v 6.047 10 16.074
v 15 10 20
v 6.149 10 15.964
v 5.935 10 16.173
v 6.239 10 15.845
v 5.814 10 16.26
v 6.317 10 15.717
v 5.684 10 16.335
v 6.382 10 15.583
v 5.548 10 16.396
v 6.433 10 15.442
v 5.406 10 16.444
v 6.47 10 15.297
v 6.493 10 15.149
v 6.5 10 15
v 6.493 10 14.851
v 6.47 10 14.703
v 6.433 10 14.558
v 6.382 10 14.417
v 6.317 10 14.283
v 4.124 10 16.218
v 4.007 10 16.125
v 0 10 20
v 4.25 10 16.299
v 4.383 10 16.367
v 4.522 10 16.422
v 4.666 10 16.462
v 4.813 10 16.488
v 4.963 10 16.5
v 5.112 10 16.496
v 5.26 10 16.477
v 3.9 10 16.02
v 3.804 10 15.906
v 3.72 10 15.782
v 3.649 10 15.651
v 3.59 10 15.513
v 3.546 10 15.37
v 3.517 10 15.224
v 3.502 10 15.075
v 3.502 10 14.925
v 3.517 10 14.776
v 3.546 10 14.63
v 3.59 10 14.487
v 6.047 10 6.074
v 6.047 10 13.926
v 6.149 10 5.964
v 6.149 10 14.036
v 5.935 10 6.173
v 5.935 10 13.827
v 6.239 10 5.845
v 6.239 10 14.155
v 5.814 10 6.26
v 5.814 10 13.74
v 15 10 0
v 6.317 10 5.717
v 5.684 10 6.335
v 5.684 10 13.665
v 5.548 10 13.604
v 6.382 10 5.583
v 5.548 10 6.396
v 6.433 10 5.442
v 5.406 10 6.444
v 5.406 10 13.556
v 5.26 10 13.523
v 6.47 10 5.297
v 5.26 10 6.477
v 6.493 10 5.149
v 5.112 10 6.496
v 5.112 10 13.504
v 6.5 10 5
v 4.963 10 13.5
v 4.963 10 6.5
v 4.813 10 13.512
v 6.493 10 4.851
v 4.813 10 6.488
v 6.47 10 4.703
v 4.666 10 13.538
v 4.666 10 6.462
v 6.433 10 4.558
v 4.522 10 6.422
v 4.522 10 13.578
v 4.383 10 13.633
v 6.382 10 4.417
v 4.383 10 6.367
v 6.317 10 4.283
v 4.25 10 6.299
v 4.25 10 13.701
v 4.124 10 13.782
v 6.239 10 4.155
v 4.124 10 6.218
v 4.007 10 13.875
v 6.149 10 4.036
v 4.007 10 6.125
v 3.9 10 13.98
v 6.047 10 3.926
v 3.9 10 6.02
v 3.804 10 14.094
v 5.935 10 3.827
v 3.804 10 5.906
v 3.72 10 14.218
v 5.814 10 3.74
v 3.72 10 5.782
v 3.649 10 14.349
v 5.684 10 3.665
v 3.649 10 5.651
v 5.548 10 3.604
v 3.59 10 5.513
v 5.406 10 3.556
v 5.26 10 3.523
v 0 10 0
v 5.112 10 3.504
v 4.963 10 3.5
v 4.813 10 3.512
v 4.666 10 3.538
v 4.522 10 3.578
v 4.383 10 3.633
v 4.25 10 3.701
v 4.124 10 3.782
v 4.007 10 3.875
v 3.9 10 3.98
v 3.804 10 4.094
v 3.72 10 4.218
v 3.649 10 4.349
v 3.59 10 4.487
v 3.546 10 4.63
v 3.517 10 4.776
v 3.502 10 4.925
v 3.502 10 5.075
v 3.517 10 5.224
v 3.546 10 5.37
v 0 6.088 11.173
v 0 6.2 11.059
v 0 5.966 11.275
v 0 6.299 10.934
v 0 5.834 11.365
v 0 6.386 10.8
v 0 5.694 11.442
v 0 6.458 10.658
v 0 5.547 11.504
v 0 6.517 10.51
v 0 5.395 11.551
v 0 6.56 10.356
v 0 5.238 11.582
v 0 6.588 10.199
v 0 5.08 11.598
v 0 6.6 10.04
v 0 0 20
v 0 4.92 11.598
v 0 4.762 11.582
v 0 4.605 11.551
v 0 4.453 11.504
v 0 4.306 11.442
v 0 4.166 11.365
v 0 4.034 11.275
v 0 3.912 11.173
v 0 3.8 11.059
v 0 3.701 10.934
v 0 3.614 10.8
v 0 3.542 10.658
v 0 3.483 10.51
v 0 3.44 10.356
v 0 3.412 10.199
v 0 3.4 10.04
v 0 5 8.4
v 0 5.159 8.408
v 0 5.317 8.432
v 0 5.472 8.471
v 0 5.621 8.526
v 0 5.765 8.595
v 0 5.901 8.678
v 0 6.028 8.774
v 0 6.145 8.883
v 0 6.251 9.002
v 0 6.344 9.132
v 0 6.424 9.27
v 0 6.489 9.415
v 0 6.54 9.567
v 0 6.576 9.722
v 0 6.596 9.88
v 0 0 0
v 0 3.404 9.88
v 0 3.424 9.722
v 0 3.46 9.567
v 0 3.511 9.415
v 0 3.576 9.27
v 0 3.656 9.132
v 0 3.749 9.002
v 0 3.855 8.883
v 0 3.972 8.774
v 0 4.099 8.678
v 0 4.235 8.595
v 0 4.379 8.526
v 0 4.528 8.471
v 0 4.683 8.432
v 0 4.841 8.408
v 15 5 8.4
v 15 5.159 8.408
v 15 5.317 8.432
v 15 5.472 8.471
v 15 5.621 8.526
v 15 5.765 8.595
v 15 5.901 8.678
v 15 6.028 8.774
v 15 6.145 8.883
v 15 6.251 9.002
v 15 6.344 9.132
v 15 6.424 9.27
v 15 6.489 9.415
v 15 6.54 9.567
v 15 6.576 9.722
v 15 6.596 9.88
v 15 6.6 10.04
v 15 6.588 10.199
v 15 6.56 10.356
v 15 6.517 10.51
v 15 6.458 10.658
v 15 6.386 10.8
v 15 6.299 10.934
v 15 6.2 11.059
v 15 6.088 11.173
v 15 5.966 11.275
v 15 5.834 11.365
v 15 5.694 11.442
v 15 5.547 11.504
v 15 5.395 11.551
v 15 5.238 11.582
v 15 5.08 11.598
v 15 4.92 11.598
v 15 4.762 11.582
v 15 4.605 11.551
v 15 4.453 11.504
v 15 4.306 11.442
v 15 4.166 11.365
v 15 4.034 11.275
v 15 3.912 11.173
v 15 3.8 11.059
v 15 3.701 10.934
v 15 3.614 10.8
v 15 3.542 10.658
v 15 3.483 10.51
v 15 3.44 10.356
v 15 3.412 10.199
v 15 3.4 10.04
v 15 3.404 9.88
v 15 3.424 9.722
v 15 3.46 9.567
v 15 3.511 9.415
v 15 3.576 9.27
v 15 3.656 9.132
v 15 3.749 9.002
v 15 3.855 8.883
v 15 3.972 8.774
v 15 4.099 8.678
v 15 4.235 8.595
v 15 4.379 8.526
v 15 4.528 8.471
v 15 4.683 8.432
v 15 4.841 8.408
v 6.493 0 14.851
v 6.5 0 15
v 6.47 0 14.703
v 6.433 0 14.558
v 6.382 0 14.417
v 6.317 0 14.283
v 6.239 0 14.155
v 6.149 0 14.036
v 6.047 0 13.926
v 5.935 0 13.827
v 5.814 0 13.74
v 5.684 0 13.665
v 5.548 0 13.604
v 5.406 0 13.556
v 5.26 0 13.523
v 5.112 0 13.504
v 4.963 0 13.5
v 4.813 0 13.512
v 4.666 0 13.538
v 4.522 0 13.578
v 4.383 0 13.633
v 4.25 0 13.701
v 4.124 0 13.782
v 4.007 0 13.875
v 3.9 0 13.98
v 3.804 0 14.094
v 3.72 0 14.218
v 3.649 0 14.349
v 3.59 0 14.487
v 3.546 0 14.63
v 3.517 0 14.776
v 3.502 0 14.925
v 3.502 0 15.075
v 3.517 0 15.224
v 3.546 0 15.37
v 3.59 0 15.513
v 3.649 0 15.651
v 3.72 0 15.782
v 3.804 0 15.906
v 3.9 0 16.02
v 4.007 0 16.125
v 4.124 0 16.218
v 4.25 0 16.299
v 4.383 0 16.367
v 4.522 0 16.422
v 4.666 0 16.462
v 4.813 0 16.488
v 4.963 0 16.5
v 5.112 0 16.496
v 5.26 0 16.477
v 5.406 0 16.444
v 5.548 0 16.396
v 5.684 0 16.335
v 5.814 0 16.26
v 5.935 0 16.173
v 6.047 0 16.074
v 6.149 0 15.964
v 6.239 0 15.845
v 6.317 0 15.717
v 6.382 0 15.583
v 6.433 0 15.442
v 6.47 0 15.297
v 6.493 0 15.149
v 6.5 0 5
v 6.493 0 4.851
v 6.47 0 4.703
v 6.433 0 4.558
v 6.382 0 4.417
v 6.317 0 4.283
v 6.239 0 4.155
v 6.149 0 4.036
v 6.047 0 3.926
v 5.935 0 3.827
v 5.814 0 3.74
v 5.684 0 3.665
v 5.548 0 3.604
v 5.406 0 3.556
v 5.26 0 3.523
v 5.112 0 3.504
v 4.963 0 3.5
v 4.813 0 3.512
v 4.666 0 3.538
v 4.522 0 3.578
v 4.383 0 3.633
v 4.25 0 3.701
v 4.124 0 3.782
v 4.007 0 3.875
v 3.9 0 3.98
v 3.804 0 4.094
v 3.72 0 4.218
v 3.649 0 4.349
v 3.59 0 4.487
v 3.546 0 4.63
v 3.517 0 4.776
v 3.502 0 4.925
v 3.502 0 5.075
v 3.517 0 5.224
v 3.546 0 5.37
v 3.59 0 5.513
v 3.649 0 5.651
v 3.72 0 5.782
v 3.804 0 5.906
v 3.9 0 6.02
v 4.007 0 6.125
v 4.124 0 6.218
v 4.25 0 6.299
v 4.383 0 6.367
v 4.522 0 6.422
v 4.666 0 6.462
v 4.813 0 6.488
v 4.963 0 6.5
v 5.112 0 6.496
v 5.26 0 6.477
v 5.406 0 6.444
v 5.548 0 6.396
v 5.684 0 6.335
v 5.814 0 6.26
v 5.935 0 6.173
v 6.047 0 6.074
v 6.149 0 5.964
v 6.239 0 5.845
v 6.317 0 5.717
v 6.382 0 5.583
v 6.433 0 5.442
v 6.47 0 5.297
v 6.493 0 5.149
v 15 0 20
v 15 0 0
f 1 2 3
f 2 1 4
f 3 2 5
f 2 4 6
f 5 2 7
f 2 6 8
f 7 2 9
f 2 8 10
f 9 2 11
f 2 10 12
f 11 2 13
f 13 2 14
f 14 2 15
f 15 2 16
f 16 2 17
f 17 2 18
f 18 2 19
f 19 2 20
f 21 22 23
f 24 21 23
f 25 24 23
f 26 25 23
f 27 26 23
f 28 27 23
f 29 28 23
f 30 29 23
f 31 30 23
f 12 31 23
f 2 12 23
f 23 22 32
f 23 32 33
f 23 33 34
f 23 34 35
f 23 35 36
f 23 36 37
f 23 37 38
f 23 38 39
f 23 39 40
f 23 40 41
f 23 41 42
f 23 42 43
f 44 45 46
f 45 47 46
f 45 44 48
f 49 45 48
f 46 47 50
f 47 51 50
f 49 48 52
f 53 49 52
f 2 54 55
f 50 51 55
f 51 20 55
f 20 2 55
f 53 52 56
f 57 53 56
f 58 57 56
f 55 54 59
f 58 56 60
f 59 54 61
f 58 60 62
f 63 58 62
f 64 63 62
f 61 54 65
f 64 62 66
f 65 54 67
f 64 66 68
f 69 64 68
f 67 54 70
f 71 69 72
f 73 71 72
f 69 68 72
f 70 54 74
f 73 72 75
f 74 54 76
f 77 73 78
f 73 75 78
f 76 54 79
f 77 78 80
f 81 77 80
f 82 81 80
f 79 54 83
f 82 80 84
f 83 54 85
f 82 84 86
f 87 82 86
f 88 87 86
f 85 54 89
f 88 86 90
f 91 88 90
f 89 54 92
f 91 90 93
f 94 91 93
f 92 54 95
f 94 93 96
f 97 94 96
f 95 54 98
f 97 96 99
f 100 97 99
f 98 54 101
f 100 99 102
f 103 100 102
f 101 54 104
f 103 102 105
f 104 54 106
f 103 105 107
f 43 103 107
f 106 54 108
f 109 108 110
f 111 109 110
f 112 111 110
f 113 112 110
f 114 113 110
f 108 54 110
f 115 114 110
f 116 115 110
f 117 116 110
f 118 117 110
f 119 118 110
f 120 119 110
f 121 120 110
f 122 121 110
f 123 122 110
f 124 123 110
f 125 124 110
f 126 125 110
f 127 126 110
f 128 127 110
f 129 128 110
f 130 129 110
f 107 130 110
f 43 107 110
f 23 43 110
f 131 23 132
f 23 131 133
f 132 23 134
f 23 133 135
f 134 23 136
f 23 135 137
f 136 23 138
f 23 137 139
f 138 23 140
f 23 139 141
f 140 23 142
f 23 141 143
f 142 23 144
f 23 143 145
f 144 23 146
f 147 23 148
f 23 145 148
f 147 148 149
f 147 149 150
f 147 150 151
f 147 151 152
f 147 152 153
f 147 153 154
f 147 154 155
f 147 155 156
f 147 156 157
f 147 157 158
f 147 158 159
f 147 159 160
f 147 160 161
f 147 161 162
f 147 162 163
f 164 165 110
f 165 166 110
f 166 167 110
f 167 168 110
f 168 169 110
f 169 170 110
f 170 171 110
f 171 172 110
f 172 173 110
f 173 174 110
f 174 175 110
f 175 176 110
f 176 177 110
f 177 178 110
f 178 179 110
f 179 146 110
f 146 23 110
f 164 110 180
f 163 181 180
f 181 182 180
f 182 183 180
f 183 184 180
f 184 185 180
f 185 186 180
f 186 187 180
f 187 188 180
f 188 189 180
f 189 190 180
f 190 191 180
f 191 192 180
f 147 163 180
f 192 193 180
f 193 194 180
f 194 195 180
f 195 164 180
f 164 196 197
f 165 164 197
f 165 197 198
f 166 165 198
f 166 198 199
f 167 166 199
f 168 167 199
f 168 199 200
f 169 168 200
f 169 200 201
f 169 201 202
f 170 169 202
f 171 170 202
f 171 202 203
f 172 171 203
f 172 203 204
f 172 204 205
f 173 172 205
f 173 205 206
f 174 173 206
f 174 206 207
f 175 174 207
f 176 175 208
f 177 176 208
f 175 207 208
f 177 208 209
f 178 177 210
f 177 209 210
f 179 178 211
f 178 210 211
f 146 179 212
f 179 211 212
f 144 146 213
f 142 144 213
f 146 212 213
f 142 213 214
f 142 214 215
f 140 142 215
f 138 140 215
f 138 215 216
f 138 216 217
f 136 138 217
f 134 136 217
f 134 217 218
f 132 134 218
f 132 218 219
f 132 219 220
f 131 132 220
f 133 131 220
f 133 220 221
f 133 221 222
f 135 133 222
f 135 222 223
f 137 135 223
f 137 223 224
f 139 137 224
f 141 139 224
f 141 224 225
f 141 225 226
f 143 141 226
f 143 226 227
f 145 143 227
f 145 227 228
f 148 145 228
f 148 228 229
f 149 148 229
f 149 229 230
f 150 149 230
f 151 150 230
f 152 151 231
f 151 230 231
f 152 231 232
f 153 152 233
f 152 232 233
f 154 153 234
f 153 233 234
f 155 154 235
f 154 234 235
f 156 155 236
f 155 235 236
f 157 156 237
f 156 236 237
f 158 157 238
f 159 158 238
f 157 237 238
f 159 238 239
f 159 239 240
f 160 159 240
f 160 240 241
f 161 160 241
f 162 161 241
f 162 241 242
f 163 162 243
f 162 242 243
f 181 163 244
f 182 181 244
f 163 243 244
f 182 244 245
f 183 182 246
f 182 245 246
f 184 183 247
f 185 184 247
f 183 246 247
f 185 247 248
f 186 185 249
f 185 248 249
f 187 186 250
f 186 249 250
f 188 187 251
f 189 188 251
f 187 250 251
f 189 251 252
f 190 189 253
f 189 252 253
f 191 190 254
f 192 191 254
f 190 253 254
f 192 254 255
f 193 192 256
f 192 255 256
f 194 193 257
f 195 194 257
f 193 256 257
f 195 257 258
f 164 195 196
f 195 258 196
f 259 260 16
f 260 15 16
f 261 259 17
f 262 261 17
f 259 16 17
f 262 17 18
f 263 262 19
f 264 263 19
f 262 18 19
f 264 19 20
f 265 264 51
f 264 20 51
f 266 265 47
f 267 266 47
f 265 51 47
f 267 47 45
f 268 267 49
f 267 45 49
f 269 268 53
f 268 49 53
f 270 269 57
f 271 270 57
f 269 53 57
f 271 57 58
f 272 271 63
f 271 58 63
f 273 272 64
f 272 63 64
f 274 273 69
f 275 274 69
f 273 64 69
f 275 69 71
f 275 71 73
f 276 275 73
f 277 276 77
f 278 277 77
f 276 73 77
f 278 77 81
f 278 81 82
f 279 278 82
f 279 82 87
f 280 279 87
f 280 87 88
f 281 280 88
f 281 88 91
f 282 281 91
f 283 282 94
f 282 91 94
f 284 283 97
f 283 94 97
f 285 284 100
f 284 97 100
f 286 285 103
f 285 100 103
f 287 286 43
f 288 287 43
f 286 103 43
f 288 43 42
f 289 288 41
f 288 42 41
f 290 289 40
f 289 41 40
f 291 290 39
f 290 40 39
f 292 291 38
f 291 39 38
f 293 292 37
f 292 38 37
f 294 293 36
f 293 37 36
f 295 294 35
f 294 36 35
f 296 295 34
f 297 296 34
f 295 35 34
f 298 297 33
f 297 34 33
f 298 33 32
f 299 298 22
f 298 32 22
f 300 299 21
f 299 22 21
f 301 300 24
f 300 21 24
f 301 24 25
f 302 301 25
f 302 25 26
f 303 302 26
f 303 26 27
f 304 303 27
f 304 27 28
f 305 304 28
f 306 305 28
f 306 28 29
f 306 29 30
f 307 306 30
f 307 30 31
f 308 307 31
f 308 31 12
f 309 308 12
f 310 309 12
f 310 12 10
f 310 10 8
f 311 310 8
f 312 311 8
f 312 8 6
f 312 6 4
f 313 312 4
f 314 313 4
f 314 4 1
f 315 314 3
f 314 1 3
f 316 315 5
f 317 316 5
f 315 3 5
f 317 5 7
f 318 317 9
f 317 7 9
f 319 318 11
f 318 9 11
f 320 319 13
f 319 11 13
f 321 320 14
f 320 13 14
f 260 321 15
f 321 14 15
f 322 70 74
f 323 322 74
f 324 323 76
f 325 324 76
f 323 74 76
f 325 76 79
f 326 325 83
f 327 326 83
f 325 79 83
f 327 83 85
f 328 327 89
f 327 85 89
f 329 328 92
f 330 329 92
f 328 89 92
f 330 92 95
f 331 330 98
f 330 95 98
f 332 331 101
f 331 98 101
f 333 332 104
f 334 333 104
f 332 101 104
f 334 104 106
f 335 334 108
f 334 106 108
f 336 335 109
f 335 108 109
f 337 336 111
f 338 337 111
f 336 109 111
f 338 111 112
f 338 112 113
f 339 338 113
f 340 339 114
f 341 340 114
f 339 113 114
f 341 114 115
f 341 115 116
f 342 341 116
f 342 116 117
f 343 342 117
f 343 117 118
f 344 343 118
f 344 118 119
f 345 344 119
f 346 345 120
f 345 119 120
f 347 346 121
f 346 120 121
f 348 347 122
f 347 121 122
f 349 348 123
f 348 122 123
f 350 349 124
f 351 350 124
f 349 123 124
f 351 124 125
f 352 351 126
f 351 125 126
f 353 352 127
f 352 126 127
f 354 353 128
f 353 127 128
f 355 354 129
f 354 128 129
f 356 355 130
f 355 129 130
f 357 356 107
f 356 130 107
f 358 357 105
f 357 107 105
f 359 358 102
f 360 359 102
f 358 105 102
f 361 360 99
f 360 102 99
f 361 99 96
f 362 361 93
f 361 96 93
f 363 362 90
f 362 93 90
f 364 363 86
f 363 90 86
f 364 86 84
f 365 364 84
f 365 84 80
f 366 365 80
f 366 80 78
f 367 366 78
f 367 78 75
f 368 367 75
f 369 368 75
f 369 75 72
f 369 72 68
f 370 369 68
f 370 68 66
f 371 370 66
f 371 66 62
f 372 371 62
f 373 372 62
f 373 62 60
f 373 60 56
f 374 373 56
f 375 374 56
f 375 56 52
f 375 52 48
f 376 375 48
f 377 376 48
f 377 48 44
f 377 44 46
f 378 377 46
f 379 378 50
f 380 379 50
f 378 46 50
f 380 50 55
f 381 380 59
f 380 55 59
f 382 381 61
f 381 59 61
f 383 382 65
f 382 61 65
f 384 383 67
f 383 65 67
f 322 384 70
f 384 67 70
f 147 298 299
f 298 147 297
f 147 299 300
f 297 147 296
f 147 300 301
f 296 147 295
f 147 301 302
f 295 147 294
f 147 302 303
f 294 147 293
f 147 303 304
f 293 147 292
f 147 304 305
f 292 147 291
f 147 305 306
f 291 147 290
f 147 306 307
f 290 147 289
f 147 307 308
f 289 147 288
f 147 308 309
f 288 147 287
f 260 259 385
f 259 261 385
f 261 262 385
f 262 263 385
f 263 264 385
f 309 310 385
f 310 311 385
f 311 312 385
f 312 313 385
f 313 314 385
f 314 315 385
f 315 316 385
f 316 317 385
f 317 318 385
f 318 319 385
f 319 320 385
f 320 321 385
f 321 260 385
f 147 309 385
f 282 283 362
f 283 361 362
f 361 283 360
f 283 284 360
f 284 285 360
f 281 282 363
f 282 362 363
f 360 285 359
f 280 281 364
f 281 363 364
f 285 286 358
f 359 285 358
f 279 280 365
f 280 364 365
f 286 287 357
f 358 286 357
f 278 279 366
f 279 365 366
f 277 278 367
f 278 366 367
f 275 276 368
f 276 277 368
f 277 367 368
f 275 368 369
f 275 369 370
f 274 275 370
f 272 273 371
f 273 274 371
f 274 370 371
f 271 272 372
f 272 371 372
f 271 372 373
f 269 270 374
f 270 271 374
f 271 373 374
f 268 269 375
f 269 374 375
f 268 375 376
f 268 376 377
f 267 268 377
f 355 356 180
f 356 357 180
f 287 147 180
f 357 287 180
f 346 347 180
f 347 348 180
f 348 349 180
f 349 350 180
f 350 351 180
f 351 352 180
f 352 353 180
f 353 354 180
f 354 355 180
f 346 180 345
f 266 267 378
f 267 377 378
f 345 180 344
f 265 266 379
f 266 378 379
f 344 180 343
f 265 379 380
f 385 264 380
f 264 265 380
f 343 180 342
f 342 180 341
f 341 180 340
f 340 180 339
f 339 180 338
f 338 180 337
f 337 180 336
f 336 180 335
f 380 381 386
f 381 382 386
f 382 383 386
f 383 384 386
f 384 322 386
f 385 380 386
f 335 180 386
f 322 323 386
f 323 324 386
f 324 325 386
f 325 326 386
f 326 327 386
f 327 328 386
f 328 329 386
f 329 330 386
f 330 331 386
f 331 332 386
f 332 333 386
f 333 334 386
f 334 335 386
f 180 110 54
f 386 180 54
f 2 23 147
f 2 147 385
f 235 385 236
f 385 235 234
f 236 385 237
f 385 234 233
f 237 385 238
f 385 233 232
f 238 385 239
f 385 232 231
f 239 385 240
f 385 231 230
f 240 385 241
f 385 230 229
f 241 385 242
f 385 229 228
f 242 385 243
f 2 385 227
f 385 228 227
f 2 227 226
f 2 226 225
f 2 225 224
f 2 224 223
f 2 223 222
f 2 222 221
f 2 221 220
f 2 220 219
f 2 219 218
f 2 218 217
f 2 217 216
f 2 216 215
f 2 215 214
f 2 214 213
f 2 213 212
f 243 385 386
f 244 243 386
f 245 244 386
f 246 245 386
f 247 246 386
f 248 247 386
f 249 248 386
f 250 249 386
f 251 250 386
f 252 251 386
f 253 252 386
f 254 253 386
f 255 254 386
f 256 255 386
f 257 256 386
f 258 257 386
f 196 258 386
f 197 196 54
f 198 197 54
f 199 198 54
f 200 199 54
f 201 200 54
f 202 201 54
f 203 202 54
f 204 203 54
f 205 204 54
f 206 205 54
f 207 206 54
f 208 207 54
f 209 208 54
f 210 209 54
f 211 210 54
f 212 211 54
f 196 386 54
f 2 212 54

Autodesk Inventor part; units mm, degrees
ref_plane "YZ Plane" through (0, 0, 0) normal (1, 0, 0) x (0, 1, 0)
ref_plane "XZ Plane" through (0, 0, 0) normal (0, 1, 0) x (-1, 0, 0)
ref_plane "XY Plane" through (0, 0, 0) normal (0, 0, 1) x (1, 0, 0)
sketch "Sketch1" plane through (0, 0, 0) normal (0, 0, 1) x (1, 0, 0)
  line L0 (0, 0) -> (15, 0)
  line L1 (15, 0) -> (15, 10)
  line L2 (15, 10) -> (0, 10)
  line L3 (0, 10) -> (0, 0)
  line L4 (1, 9) -> (14, 9)
  line L5 (14, 9) -> (14, 1)
  line L6 (14, 1) -> (1, 1)
  line L7 (1, 1) -> (1, 9)
  dimension "d0" = 15
  dimension "d1" = 10
  dimension "d2" = 13
  dimension "d3" = 8
  dimension "d4" = 1
  dimension "d5" = 1
extrude "Extrusion1" add sketch "Sketch1" along normal blind 20 contours L3 L2 L1 L0 | L4 L5 L6 L7
sketch "Sketch2" plane through (0, 10, 0) normal (0, 1, 0) x (1, 0, 0)
  line L0 (15, 0) -> (0, 0) projected
  line L1 (0, 0) -> (0, -20) projected
  line L2 (15, -20) -> (0, -20) projected
  line L3 (15, 0) -> (15, -20) projected
  circle A0 centre (5, -5) radius 1.5
  circle A1 centre (5, -15) radius 1.5
  dimension "d8" = 3
  dimension "d9" = 3
  dimension "d10" = 5
  dimension "d11" = 5
  dimension "d12" = 5
  dimension "d13" = 5
extrude "Extrusion2" cut sketch "Sketch2" against normal up to surface (10 mm away) contours A0 | A1
sketch "Sketch3" plane through (15, 0, 0) normal (1, 0, 0) x (0, 0, -1)
  line L0 (0, 0) -> (0, 10) projected
  line L1 (0, 10) -> (-20, 10) projected
  line L2 (-20, 0) -> (-20, 10) projected
  line L3 (0, 0) -> (-20, 0) projected
  circle A0 centre (-10, 5) radius 1.6
  dimension "d16" = 3.2
  dimension "d17" = 5
  dimension "d18" = 10
extrude "Extrusion3" cut sketch "Sketch3" against normal up to surface (15 mm away) contours A0
properties part number "profile1_3D"
